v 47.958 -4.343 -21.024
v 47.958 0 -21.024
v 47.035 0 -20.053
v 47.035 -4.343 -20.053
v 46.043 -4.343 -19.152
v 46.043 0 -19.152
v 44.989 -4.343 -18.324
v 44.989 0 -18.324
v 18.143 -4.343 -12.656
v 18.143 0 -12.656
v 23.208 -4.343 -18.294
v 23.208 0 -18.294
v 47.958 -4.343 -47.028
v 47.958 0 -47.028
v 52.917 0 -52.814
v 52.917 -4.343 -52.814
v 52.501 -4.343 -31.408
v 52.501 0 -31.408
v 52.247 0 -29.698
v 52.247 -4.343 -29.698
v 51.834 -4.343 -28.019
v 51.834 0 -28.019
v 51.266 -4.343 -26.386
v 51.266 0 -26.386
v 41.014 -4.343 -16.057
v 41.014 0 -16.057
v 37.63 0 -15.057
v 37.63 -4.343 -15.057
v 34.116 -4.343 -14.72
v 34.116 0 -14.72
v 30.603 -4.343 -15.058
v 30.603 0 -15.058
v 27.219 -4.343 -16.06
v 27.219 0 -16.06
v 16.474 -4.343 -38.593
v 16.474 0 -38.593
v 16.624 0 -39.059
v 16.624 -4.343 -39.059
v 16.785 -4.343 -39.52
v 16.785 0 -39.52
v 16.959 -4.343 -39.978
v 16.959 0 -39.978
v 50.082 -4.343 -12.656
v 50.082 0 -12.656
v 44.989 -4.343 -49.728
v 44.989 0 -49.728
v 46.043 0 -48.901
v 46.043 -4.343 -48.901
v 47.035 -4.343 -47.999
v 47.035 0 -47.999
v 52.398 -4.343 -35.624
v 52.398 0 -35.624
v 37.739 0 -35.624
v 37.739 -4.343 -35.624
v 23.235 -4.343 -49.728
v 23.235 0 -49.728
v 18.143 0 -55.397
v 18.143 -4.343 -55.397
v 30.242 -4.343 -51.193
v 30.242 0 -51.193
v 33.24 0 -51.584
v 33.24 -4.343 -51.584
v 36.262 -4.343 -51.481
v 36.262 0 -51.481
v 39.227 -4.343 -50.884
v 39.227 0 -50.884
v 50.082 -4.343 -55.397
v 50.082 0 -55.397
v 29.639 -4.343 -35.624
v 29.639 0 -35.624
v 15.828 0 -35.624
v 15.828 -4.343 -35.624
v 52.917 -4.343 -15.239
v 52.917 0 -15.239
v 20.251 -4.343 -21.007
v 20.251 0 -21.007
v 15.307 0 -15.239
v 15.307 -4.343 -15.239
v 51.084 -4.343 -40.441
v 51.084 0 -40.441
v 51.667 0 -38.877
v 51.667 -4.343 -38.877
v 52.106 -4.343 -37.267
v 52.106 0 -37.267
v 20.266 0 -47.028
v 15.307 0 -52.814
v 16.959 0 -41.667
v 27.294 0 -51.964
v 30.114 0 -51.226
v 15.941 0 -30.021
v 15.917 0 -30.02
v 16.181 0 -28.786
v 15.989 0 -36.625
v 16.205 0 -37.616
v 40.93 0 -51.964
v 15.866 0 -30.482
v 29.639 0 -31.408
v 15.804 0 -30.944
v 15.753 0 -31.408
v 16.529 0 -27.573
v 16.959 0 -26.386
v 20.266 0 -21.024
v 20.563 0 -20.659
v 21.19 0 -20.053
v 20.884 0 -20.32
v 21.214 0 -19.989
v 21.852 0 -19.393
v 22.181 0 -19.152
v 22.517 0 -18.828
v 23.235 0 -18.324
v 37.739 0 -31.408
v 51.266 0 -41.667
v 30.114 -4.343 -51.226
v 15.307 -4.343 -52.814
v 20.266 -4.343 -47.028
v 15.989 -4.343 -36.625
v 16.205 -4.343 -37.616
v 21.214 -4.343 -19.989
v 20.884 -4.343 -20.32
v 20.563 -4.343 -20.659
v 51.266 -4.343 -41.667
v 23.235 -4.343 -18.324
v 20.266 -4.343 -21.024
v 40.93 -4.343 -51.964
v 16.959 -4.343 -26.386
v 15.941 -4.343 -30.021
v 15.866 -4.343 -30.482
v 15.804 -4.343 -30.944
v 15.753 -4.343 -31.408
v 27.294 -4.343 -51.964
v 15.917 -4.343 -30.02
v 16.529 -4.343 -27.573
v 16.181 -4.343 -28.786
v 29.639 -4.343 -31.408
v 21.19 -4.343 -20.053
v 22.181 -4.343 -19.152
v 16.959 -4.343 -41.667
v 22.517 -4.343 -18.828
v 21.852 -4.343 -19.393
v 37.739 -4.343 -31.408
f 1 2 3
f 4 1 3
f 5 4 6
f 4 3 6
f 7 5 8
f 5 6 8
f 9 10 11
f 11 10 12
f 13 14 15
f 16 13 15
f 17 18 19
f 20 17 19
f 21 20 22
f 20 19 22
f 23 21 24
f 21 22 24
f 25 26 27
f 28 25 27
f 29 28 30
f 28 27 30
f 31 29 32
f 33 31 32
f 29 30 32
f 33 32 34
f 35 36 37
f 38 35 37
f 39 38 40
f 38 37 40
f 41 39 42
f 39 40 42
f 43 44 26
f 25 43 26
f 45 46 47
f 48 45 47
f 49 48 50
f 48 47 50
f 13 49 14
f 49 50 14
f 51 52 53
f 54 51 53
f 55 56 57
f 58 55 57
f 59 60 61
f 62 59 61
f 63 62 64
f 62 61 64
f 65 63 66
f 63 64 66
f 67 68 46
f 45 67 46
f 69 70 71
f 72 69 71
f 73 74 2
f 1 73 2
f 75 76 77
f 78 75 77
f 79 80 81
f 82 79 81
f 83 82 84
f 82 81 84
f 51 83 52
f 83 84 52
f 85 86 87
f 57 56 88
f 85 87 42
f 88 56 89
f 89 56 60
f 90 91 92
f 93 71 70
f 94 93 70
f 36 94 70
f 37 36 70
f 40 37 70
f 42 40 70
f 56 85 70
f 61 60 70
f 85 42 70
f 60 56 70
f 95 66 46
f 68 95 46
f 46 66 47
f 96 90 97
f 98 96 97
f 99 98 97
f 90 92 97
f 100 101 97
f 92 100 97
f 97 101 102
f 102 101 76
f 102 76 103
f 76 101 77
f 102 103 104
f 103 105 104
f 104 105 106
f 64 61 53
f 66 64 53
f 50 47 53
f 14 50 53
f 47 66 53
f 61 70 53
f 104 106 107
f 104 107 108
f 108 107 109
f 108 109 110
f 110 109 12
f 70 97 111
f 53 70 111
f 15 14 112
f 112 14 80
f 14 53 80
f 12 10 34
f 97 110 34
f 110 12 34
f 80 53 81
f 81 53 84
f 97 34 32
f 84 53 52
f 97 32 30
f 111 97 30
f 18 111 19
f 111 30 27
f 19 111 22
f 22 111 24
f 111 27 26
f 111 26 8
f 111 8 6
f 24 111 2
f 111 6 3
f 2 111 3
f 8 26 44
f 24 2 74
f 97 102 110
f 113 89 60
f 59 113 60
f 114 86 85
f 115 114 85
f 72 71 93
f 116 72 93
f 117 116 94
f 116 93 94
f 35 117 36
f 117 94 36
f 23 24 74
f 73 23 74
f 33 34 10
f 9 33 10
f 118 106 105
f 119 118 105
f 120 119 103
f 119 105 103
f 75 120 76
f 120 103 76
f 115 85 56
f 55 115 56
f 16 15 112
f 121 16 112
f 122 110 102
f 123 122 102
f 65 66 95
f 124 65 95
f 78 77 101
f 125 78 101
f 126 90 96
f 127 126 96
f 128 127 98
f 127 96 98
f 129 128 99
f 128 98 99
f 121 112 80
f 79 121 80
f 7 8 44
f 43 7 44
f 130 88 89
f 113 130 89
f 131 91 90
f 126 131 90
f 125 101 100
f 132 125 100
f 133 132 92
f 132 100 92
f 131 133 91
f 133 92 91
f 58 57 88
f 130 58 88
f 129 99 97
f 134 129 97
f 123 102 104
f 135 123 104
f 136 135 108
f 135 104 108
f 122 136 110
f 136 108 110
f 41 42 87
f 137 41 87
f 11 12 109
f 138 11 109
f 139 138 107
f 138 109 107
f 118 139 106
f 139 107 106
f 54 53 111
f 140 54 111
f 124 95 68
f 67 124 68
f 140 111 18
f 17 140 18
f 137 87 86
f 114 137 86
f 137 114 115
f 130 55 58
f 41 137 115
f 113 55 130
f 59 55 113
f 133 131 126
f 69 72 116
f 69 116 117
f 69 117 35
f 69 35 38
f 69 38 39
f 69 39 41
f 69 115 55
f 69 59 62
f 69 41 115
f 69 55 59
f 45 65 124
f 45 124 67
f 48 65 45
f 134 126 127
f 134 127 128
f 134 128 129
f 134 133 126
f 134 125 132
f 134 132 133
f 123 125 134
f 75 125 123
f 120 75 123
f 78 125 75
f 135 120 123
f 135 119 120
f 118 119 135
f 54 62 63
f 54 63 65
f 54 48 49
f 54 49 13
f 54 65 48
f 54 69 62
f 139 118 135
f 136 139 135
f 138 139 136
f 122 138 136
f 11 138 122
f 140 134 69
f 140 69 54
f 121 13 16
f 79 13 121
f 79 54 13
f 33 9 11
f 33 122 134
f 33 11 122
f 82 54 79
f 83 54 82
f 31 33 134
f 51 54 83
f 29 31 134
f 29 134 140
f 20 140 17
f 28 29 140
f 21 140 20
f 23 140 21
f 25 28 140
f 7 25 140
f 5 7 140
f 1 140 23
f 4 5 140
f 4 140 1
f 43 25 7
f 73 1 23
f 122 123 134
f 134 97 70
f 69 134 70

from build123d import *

# Parameters (mm, degrees)
F1_DEPTH = 4.3434


with BuildPart() as f1:
    # F0 (on Front) → F1 (new body)
    with BuildSketch(Plane.XZ):
        with BuildLine():
            ThreePointArc((15.940657, -30.021235), (15.833766, -30.712775), (15.753128, -31.407866))
            Line((15.753128, -31.407866), (15.761479, -31.407866))
            ThreePointArc((15.761479, -31.407866), (15.837097, -30.743943), (15.936717, -30.083195))
            Line((15.936717, -30.083195), (15.940657, -30.021235))
        make_face()
        with BuildLine():
            ThreePointArc((15.936717, -30.083195), (15.837097, -30.743943), (15.761479, -31.407866))
            Line((15.761479, -31.407866), (29.639391, -31.407866))
            Line((29.639391, -31.407866), (29.639391, -34.026345))
            Line((29.639391, -34.026345), (37.738703, -34.026345))
            Line((37.738703, -34.026345), (37.738703, -33.516066))
            Line((37.738703, -33.516066), (37.738703, -31.407866))
            Line((37.738703, -31.407866), (52.500848, -31.407866))
            ThreePointArc((52.500848, -31.407866), (52.059884, -28.853474), (51.265883, -26.385899))
            Line((51.265883, -26.385899), (52.917353, -15.238802))
            Line((52.917353, -15.238802), (47.958307, -21.024324))
            ThreePointArc((47.958307, -21.024324), (46.547291, -19.593445), (44.989268, -18.324217))
            Line((44.989268, -18.324217), (50.081812, -12.655849))
            Line((50.081812, -12.655849), (41.014464, -16.056665))
            Line((41.014464, -16.056665), (40.930312, -16.088227))
            ThreePointArc((40.930312, -16.088227), (34.112246, -14.784679), (27.294179, -16.088227))
            Line((27.294179, -16.088227), (27.21875, -16.059937))
            Line((27.21875, -16.059937), (18.142679, -12.655849))
            Line((18.142679, -12.655849), (23.20848, -18.294449))
            Line((23.20848, -18.294449), (23.235223, -18.324217))
            Line((23.235223, -18.324217), (20.266184, -21.024324))
            Line((20.266184, -21.024324), (20.25096, -21.006563))
            Line((20.25096, -21.006563), (15.307139, -15.238802))
            Line((15.307139, -15.238802), (16.958609, -26.385899))
            ThreePointArc((16.958609, -26.385899), (16.344763, -28.176471), (15.917278, -30.020437))
            Line((15.917278, -30.020437), (15.940657, -30.021235))
            Line((15.940657, -30.021235), (15.936717, -30.083195))
        make_face()
        with BuildLine():
            Line((37.738703, -34.026345), (29.639391, -34.026345))
            Line((29.639391, -34.026345), (29.639391, -35.624266))
            Line((29.639391, -35.624266), (15.82806, -35.624266))
            ThreePointArc((15.82806, -35.624266), (16.090138, -37.12187), (16.474419, -38.592866))
            ThreePointArc((16.474419, -38.592866), (16.702769, -39.290058), (16.958609, -39.977639))
            Line((16.958609, -39.977639), (16.958609, -41.666792))
            Line((16.958609, -41.666792), (15.307139, -52.813889))
            Line((15.307139, -52.813889), (20.266184, -47.028366))
            Line((20.266184, -47.028366), (23.235223, -49.728474))
            Line((23.235223, -49.728474), (18.142679, -55.396842))
            Line((18.142679, -55.396842), (27.294179, -51.964463))
            Line((27.294179, -51.964463), (30.11443, -51.22633))
            Line((30.11443, -51.22633), (30.241821, -51.192989))
            ThreePointArc((30.241821, -51.192989), (34.753518, -51.594634), (39.227042, -50.884485))
            Line((39.227042, -50.884485), (40.930312, -51.964463))
            Line((40.930312, -51.964463), (50.081812, -55.396842))
            Line((50.081812, -55.396842), (44.989268, -49.728474))
            ThreePointArc((44.989268, -49.728474), (46.547291, -48.459245), (47.958307, -47.028366))
            Line((47.958307, -47.028366), (52.917353, -52.813889))
            Line((52.917353, -52.813889), (51.265883, -41.666792))
            Line((51.265883, -41.666792), (51.084311, -40.441218))
            Line((51.084311, -40.441218), (51.079733, -40.410318))
            ThreePointArc((51.079733, -40.410318), (51.90089, -38.061868), (52.398499, -35.624266))
            Line((52.398499, -35.624266), (37.738703, -35.624266))
            Line((37.738703, -35.624266), (37.738703, -34.026345))
        make_face()
        with BuildLine():
            ThreePointArc((21.213653, -19.98888), (20.72264, -20.488578), (20.25096, -21.006563))
            Line((20.25096, -21.006563), (20.266184, -21.024324))
            ThreePointArc((20.266184, -21.024324), (21.6772, -19.593445), (23.235223, -18.324217))
            Line((23.235223, -18.324217), (23.20848, -18.294449))
            ThreePointArc((23.20848, -18.294449), (22.18097, -19.106233), (21.213653, -19.98888))
        make_face()
        with BuildLine():
            ThreePointArc((51.084311, -40.441218), (51.904816, -38.077325), (52.398499, -35.624266))
            ThreePointArc((52.398499, -35.624266), (51.90089, -38.061868), (51.079733, -40.410318))
            Line((51.079733, -40.410318), (51.084311, -40.441218))
        make_face()
        with BuildLine():
            ThreePointArc((41.014464, -16.056665), (34.11629, -14.719787), (27.21875, -16.059937))
            Line((27.21875, -16.059937), (27.294179, -16.088227))
            ThreePointArc((27.294179, -16.088227), (34.112246, -14.784679), (40.930312, -16.088227))
            Line((40.930312, -16.088227), (41.014464, -16.056665))
        make_face()
    extrude(amount=F1_DEPTH)


solid = f1.part
